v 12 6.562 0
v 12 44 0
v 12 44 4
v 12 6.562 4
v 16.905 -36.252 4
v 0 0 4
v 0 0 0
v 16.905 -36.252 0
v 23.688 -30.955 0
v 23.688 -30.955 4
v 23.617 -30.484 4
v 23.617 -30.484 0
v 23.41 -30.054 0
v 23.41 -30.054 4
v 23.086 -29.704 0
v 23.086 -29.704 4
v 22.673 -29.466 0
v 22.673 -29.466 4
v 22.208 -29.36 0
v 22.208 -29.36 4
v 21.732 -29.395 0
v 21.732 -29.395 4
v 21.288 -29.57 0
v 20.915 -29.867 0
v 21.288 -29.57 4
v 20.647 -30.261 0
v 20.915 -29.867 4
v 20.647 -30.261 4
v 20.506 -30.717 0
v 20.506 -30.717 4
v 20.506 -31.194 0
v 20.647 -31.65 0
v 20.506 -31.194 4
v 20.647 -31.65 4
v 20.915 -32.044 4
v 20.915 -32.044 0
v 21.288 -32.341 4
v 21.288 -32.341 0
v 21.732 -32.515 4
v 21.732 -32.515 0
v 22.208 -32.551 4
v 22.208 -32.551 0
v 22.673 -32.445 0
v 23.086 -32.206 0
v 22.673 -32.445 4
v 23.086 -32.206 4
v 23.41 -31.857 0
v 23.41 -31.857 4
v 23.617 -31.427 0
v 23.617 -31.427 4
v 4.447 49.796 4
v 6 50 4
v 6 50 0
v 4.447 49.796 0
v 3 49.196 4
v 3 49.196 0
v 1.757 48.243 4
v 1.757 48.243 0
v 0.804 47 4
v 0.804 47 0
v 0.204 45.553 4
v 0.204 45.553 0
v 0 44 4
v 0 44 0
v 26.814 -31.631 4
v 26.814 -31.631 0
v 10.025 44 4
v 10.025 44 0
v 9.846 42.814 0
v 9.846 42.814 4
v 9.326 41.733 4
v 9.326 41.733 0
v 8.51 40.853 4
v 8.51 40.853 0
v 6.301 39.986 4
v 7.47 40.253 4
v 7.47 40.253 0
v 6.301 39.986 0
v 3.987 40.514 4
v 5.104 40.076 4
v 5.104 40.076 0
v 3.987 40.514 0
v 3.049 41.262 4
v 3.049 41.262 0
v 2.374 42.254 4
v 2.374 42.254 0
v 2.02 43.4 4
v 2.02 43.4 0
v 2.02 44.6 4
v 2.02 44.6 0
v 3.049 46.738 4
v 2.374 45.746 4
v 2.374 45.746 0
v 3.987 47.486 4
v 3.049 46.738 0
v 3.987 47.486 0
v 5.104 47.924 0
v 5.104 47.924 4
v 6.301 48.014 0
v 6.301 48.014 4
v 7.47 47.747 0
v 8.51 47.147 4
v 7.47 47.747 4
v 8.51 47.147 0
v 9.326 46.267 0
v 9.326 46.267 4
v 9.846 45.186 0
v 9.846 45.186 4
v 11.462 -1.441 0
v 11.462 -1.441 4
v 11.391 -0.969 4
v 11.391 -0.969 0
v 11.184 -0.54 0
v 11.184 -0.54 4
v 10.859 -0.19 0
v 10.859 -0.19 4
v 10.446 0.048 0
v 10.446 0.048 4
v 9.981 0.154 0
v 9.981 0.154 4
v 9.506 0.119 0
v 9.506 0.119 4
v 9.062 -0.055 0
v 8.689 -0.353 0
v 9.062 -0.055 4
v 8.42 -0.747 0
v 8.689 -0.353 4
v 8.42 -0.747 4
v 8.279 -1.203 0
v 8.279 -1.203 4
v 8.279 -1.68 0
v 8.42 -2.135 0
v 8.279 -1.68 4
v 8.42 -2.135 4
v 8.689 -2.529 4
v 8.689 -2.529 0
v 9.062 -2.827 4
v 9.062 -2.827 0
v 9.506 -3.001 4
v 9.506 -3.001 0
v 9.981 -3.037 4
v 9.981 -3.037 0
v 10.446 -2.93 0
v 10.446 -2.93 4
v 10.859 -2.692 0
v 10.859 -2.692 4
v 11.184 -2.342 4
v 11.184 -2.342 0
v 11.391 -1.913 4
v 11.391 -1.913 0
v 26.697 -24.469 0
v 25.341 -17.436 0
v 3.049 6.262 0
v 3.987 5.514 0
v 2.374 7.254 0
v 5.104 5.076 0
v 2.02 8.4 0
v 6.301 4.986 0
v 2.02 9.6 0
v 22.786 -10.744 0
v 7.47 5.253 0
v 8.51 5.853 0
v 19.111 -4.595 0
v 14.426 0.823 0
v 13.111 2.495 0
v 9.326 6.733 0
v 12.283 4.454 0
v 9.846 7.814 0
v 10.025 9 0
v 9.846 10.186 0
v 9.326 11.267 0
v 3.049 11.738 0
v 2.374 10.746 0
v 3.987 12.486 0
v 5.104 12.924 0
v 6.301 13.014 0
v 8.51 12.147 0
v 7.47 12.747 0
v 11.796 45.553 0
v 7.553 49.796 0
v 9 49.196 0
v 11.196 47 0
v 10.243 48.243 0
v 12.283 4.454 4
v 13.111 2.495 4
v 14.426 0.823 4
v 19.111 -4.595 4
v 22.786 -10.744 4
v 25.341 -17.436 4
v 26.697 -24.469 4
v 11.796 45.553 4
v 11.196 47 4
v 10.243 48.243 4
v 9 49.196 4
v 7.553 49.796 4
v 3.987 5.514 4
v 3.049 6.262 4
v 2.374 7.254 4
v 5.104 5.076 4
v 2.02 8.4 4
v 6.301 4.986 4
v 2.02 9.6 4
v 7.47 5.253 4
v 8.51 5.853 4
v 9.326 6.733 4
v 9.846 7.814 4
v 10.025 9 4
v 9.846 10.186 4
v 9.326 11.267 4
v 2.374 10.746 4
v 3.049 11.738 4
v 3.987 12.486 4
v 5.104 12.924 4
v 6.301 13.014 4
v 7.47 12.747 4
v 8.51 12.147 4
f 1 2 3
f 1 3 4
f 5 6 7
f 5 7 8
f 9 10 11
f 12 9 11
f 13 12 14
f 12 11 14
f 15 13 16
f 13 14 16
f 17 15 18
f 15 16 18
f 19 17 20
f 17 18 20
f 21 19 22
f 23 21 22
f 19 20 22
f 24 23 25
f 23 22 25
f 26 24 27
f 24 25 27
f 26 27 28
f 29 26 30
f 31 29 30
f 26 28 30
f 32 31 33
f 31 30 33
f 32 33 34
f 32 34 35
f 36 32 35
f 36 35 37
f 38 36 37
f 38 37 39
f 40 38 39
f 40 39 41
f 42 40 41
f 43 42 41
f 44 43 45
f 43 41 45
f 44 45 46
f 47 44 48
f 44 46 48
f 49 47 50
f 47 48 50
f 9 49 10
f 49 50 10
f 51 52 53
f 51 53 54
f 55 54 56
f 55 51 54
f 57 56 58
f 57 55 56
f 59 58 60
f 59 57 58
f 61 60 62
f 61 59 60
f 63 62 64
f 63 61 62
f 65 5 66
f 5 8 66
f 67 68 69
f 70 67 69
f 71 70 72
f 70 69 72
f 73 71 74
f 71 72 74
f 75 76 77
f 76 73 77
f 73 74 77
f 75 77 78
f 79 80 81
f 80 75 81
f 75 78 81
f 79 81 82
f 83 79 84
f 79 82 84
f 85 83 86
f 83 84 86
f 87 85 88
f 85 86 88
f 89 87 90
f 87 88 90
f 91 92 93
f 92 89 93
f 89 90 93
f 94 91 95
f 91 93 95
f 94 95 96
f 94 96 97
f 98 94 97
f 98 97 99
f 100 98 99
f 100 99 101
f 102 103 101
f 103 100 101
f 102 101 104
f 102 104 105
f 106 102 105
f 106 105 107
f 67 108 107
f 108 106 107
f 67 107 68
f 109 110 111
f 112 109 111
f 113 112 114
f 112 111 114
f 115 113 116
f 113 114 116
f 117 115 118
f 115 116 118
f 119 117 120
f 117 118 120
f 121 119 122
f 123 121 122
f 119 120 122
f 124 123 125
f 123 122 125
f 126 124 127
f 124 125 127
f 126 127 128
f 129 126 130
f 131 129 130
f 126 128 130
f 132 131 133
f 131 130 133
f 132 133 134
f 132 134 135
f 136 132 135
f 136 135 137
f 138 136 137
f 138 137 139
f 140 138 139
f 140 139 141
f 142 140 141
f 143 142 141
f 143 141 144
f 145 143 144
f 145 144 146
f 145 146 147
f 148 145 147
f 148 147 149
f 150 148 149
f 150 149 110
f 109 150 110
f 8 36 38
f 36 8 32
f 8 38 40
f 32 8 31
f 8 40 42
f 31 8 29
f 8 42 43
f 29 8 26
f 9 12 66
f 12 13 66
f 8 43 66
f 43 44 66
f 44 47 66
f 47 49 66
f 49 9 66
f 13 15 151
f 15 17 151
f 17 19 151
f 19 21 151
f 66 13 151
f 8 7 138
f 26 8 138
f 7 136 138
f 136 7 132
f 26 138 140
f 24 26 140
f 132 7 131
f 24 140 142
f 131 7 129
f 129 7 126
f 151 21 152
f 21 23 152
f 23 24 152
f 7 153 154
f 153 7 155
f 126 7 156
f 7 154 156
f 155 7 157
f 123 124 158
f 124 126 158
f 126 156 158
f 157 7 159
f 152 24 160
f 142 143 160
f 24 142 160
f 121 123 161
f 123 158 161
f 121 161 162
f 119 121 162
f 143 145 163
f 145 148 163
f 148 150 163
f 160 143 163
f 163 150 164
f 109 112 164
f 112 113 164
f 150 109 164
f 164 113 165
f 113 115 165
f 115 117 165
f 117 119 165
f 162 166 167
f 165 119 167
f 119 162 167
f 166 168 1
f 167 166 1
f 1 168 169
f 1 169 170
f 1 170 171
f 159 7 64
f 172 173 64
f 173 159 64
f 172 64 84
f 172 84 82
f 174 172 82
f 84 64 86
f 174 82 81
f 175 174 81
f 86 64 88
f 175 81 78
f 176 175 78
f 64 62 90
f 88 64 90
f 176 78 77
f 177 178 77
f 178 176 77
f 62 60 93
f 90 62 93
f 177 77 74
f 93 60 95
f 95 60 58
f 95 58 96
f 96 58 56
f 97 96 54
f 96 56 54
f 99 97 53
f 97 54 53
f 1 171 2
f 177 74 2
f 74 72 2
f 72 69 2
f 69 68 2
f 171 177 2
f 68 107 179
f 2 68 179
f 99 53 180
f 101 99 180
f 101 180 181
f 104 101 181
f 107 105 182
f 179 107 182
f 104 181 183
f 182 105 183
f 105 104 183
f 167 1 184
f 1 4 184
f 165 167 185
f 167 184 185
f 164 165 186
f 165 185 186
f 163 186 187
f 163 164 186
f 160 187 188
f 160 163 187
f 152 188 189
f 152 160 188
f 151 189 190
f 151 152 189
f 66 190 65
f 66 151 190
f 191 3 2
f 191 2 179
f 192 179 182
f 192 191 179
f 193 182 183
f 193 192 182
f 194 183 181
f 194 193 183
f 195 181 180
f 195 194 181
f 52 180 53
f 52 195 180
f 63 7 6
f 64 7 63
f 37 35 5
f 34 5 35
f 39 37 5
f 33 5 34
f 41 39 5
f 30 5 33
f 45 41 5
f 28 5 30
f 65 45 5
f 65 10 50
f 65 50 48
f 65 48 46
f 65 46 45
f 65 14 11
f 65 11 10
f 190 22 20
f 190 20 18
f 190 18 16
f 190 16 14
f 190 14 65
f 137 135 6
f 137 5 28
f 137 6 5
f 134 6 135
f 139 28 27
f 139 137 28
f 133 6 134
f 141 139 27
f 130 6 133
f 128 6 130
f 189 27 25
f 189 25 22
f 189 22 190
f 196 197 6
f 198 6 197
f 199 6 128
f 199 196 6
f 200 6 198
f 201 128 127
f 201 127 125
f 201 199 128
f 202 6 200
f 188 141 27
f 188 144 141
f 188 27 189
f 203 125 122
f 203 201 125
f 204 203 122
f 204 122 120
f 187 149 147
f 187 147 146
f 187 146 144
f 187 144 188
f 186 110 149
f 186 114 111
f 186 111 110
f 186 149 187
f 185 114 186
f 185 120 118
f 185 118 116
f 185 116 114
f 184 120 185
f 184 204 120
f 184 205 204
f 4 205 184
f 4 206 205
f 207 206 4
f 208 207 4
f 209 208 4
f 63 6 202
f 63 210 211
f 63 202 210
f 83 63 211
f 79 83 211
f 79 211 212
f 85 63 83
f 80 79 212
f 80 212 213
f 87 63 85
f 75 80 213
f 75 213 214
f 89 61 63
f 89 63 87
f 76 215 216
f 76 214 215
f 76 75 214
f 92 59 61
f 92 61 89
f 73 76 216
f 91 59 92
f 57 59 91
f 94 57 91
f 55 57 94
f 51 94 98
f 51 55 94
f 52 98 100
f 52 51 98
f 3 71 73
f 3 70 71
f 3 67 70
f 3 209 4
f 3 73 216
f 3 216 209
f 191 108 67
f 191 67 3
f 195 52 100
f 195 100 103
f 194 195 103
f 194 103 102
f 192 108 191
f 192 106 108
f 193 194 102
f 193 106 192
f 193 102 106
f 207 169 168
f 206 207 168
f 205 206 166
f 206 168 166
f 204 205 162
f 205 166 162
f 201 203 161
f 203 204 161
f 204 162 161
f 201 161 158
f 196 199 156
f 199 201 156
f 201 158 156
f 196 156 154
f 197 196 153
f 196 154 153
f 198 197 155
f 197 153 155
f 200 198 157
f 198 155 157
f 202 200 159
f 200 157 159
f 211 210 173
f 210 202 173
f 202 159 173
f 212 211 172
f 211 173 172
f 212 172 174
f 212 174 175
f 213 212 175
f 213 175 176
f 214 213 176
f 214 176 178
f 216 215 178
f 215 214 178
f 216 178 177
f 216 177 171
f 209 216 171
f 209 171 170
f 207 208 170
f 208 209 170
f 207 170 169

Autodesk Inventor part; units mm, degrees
ref_plane "YZ Plane" through (0, 0, 0) normal (1, 0, 0) x (0, 1, 0)
ref_plane "XZ Plane" through (0, 0, 0) normal (0, 1, 0) x (-1, 0, 0)
ref_plane "XY Plane" through (0, 0, 0) normal (0, 0, 1) x (1, 0, 0)
sketch "스케치1" plane through (0, 0, 0) normal (0, 0, 1) x (1, 0, 0)
  line L0 (0, 0) -> (8.4524, -18.1262)
  line L1 (0, 0) -> (20, 0) construction
  line L2 (8.4524, -18.1262) -> (14.7965, -15.1678)
  line L3 (8.4524, -18.1262) -> (16.9047, -36.2523)
  line L4 (8.4524, -18.1262) -> (28.4524, -18.1262) construction
  arc A0 (16.9047, -36.2523) -> (0, 0) centre (-14.2701, -28.7218) ccw
  line L5 (0, 0) -> (0, 50)
  line L6 (0, 0) -> (50, 0) construction
  line L7 (0, 50) -> (12, 50)
  line L8 (12, 50) -> (12, 3)
  circle A1 centre (6, 44) radius 4.025
  circle A2 centre (6, 9) radius 4.025
  line L9 (16.9047, -36.2523) -> (26.8143, -31.6314)
  line L10 (16.9047, -36.2523) -> (27.8387, -36.2523) construction
  line L11 (12, -47.3039) -> (11.9482, -47.1928)
  arc A3 (26.2229, -36.2523) -> (12, 3) centre (-14.2701, -28.7218) ccw
  dimension "d16" = 20
  dimension "d17" = 65
  dimension "d18" = 7
  dimension "d19" = 90
  dimension "d20" = 20
  dimension "d21" = 65
  dimension "d22" = 50
  dimension "d23" = 90
  dimension "d24" = 12
  dimension "d25" = 90
  dimension "d26" = 47
  dimension "d27" = 8.05
  dimension "d28" = 8.05
  dimension "d29" = 6
  dimension "d30" = 6
  dimension "d31" = 6
  dimension "d32" = 35
  dimension "d33" = 25
extrude "돌출1" add sketch "스케치1" along normal blind 4 contours L5 L7 L8 A3 L9 A0
fillet "모깎기1" radius 6 2 edges at (12, 50, 2) (0, 50, 2)
sketch "스케치2" plane through (0, 0, 4) normal (0, 0, 1) x (1, 0, 0)
  line L0 (16.9047, -36.2523) -> (26.8143, -31.6314) projected
  arc A0 (17.3077, -34.3271) -> (18.715, -35.4082) centre (18.2923, -34.5019) ccw projected
  arc A1 (26.2765, -31.8822) -> (26.8523, -31.032) centre (25.8539, -30.9759) ccw projected
  line L1 (20, -34.809) -> (17.8869, -30.2774)
  line L2 (20, -34.809) -> (25, -34.809) construction
  line L3 (17.8869, -30.2774) -> (26.834, -26.1053)
  arc A2 (26.8143, -31.6314) -> (12, 3) centre (-14.2701, -28.7218) ccw projected
  line L4 (26.834, -26.1053) -> (17.7607, -30.3363)
  arc A3 (16.9047, -36.2523) -> (0, 0) centre (-14.2701, -28.7218) ccw projected
  arc A4 (26.2765, -31.8822) -> (26.8523, -31.032) centre (25.8539, -30.9759) ccw projected
  line L5 (26.834, -26.1053) -> (16.9047, -36.2523)
  line L6 (17.7607, -30.3363) -> (26.8143, -31.6314)
  circle A5 centre (22.0881, -30.9553) radius 1.6
  point P0 (12.3536, 2.7038)
  point P1 (0.5383, -0.2738)
  dimension "d38" = 5
  dimension "d39" = 115
  dimension "d40" = 90
  dimension "d41" = 3.2
extrude "돌출2" cut sketch "스케치2" against normal blind 4 contours A5 L6 L5 | L5 L6 A5 | A5 L5 L6 | L5 A5 L6
sketch "스케치4" plane through (0, 0, 4) normal (0, 0, 1) x (1, 0, 0)
  line L0 (12, 3) -> (12, 44) projected
  line L1 (12, 3) -> (2.5423, -1.4102)
  arc A0 (16.9047, -36.2523) -> (0, 0) centre (-14.2701, -28.7218) ccw projected
  line L2 (12, 3) -> (22.4355, 3) construction
  line L3 (7.2711, 0.7949) -> (9.8068, -4.643)
  line L4 (7.2711, 0.7949) -> (13.2711, 0.7949) construction
  line L5 (9.8068, -4.643) -> (7.8894, -5.5371)
  line L6 (9.8068, -4.643) -> (16.6121, -1.4696)
  arc A1 (26.8143, -31.6314) -> (12, 3) centre (-14.2701, -28.7218) ccw projected
  line L7 (9.8068, -4.643) -> (17.3156, -4.643) construction
  line L8 (2.5423, -1.4102) -> (16.6121, -1.4696)
  line L9 (7.8894, -5.5371) -> (12, 3)
  circle A2 centre (9.8616, -1.4411) radius 1.6
  dimension "d54" = 155
  dimension "d55" = 6
  dimension "d57" = 25
  dimension "d58" = 3.2
extrude "돌출4" cut sketch "스케치4" against normal up to surface (4 mm away) contours A2 L8 L9 | L9 L8 L3 A2 | L3 L8 A2 | A2 L9 L8 | L9 A2 L3 L8 | L8 L3 A2
sketch "스케치6" plane through (0, 0, 4) normal (0, 0, 1) x (1, 0, 0)
  line L0 (0, 0) -> (16.9047, -36.2523)
  circle A0 centre (9.8616, -1.4411) radius 1.6 projected
  circle A1 centre (22.0881, -30.9553) radius 1.6 projected
  arc A2 (12, 44) -> (0, 44) centre (6, 44) ccw projected
  line L1 (0, 44) -> (0, 0) projected
  arc A3 (16.9047, -36.2523) -> (0, 0) centre (-14.2701, -28.7218) ccw projected
  line L2 (16.9047, -36.2523) -> (26.8143, -31.6314) projected
  arc A4 (26.8143, -31.6314) -> (12, 3) centre (-14.2701, -28.7218) ccw projected
  line L3 (12, 3) -> (12, 44) projected
extrude "돌출6" add sketch "스케치6" against normal up to surface (4 mm away) contours A3 L0
fillet "모깎기3" radius 8 1 edges at (12, 3, 2)
properties part number "Grip_" material "알루미늄 6061"
